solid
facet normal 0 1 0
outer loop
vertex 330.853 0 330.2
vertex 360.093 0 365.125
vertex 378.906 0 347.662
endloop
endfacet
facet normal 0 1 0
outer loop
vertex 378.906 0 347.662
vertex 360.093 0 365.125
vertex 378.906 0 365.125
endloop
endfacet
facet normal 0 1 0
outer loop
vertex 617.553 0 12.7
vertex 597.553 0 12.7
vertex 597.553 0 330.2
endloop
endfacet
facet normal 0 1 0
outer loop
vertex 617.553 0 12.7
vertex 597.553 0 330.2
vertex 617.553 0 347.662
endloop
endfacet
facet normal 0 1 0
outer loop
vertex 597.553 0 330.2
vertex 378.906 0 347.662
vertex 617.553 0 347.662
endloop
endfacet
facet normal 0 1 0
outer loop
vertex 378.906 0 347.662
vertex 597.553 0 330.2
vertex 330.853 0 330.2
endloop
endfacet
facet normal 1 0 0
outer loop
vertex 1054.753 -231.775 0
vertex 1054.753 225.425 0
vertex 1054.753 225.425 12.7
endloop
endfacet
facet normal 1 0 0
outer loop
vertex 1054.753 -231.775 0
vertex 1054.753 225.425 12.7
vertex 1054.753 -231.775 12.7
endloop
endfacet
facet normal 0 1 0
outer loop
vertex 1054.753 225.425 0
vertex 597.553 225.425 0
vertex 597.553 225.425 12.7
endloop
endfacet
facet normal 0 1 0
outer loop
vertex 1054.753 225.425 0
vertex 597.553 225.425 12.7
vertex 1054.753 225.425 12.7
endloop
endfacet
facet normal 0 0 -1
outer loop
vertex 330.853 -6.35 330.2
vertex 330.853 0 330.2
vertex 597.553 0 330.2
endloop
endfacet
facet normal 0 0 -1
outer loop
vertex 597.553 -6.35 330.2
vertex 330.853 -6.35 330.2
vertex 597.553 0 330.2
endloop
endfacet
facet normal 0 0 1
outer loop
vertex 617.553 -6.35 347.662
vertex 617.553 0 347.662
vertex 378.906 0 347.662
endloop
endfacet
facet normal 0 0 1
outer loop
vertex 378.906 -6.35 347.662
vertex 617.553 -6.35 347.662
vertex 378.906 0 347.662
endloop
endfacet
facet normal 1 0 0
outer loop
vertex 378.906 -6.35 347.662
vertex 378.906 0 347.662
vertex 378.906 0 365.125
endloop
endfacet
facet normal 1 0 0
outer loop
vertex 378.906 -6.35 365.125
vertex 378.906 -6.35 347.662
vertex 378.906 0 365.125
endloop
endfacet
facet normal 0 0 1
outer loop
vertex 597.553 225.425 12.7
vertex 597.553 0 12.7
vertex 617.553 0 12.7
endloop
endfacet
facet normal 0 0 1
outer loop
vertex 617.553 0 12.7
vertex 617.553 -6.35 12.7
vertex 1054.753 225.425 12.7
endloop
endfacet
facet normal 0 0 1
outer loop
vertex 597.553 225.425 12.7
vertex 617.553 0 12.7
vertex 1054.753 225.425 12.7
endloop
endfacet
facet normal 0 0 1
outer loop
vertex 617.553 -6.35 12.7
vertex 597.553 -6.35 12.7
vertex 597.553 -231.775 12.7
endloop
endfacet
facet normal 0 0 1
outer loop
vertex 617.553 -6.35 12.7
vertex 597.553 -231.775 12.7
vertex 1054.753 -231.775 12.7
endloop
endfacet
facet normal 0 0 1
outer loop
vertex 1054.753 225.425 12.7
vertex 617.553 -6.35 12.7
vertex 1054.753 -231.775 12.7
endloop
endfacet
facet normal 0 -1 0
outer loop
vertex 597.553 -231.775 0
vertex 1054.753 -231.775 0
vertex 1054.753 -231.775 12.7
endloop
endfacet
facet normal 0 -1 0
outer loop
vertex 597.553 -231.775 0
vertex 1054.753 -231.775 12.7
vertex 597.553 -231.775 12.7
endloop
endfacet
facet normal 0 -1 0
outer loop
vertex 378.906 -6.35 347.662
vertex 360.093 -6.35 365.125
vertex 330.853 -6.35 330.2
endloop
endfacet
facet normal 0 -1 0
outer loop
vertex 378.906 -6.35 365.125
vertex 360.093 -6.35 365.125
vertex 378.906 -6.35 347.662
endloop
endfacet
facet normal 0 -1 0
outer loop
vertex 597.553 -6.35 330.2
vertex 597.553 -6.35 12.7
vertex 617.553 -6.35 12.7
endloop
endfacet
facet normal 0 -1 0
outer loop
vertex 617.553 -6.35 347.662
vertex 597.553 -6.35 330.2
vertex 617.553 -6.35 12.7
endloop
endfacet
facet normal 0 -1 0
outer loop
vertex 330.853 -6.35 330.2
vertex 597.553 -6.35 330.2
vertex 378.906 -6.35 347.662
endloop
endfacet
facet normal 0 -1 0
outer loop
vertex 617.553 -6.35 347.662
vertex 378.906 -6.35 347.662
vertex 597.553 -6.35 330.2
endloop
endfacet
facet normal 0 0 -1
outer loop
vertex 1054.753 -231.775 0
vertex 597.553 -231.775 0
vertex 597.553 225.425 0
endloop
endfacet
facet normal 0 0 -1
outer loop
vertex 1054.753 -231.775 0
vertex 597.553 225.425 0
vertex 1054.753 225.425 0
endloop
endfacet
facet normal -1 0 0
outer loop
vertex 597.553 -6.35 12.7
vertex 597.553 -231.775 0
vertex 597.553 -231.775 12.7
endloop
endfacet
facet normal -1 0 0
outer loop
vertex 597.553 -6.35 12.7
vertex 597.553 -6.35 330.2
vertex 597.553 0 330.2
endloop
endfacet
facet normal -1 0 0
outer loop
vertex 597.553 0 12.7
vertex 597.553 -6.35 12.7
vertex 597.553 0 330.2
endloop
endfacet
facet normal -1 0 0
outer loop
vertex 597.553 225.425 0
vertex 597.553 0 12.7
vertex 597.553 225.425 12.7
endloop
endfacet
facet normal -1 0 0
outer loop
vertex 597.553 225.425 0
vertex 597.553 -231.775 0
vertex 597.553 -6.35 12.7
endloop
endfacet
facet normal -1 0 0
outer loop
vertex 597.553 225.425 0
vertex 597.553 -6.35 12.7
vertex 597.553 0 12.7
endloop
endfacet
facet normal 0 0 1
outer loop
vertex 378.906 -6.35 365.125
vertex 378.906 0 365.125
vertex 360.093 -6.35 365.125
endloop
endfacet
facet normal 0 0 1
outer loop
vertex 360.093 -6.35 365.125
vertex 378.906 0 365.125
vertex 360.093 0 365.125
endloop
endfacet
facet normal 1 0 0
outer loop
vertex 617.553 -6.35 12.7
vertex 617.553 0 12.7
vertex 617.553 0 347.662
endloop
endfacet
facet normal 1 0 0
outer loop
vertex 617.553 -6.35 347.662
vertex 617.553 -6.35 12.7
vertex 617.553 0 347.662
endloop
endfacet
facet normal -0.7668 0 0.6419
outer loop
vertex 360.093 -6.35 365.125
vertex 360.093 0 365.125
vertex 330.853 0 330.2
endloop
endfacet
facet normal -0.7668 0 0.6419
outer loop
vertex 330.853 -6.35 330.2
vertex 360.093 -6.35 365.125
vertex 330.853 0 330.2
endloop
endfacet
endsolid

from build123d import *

# Parameters (mm, degrees)
F1_DEPTH = 6.35
F2_DEPTH = 25
F4_DEPTH = 12.7


with BuildPart() as f1:
    # F0 (on Front) → F1 (new body)
    with BuildSketch(Plane.XZ):
        with BuildLine():
            Line((-31.097302, 79.375), (-31.097302, 0))
            Line((-31.097302, 0), (597.552698, 0))
            Line((597.552698, 0), (597.552698, 158.75))
            Line((597.552698, 158.75), (76.952726, 158.75))
            ThreePointArc((76.952726, 158.75), (10.848593, 135.505324), (-31.097302, 79.375))
        make_face()
        Polygon((597.552698, 158.75), (597.552698, 0), (617.552698, 0), (617.552698, 330.2), (617.552698, 347.6625), (597.552698, 347.6625), (597.552698, 330.2), align=None)
        Polygon((330.852698, 330.2), (597.552698, 330.2), (597.552698, 347.6625), (378.905624, 347.6625), (378.905624, 365.125), (360.092938, 365.125), align=None)
    extrude(amount=F1_DEPTH)

    # F0 (on Front) → F2 (cut)
    with BuildSketch(Plane.XZ):
        with BuildLine():
            Line((-31.097302, 79.375), (-31.097302, 0))
            Line((-31.097302, 0), (597.552698, 0))
            Line((597.552698, 0), (597.552698, 158.75))
            Line((597.552698, 158.75), (76.952726, 158.75))
            ThreePointArc((76.952726, 158.75), (10.848593, 135.505324), (-31.097302, 79.375))
        make_face()
    extrude(amount=F2_DEPTH, mode=Mode.SUBTRACT)

    # F3 (on face) → F4 (join)
    with BuildSketch(Plane(origin=(0, 0, 0), x_dir=(1, 0, 0), z_dir=(0, 0, -1))):
        Polygon((597.552698, 16.692741), (597.552698, 3.175), (597.552698, -225.425), (1054.752698, -225.425), (1054.752698, 231.775), (597.552698, 231.775), align=None)
    extrude(amount=-F4_DEPTH)


solid = f1.part
